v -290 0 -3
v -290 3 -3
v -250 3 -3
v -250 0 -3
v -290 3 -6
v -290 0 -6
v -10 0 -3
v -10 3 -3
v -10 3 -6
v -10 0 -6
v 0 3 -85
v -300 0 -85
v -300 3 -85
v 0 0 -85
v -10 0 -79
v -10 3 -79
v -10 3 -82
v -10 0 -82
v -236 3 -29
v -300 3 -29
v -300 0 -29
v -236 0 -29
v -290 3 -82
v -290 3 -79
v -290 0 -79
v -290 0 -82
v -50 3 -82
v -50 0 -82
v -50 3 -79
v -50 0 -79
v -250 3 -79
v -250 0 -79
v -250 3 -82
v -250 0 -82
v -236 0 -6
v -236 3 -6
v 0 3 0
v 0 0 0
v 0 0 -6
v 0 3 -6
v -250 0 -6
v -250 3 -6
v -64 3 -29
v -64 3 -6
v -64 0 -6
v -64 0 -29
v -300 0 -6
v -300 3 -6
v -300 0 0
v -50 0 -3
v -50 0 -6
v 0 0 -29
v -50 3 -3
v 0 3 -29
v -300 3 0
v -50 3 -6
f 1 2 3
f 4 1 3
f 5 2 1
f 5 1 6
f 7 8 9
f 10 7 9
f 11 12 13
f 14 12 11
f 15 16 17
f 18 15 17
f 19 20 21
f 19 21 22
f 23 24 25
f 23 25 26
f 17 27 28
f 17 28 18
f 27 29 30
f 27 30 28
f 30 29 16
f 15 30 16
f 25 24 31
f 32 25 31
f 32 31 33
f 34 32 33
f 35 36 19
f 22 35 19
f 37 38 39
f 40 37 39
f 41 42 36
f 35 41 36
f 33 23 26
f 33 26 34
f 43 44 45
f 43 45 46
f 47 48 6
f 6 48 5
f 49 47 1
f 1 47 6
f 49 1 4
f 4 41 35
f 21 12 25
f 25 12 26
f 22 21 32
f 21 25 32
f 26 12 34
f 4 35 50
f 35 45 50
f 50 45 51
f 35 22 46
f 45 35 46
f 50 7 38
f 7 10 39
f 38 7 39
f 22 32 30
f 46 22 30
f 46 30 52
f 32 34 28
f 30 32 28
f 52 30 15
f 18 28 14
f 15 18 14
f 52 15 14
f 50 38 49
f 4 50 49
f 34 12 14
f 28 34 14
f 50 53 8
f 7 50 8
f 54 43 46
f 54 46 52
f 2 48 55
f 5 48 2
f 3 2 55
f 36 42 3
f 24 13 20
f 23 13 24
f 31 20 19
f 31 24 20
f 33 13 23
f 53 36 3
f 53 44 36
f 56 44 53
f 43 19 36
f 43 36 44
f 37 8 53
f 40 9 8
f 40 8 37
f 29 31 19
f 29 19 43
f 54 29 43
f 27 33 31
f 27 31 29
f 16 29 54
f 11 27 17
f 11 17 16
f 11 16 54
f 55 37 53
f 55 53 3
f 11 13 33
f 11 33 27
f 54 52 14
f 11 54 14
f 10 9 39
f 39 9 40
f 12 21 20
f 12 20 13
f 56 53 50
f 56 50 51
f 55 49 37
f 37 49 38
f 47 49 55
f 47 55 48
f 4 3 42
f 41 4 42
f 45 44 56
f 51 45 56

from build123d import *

# Parameters (mm, degrees)
SKETCH1_W           = 300
SKETCH1_H           = 85
BOSS_EXTRUDE1_DEPTH = 3
SKETCH2_W           = 40
SKETCH2_H           = 3
CUT_EXTRUDE1_DEPTH  = 3
SKETCH3_W           = 40
SKETCH3_H           = 3
CUT_EXTRUDE2_DEPTH  = 3
SKETCH4_W           = 40
SKETCH4_H           = 3
CUT_EXTRUDE3_DEPTH  = 3
SKETCH5_W           = 40
SKETCH5_H           = 3
CUT_EXTRUDE4_DEPTH  = 3
SKETCH6_W           = 64
SKETCH6_H           = 23
CUT_EXTRUDE6_DEPTH  = 3
SKETCH7_W           = 64
SKETCH7_H           = 23
CUT_EXTRUDE7_DEPTH  = 3


with BuildPart() as part:
    # Sketch1 → Boss-Extrude1 (new body)
    with BuildSketch(Plane(origin=(0, 0, 0), x_dir=(1, 0, 0), z_dir=(0, 1, 0))):
        with Locations((-150, 42.5)):
            Rectangle(SKETCH1_W, SKETCH1_H)
    extrude(amount=BOSS_EXTRUDE1_DEPTH)

    # Sketch2 → Cut-Extrude1 (cut)
    with BuildSketch(Plane(origin=(0, 3, 0), x_dir=(1, 0, 0), z_dir=(0, 1, 0))):
        with Locations((-270, 4.5)):
            Rectangle(SKETCH2_W, SKETCH2_H)
    extrude(amount=-CUT_EXTRUDE1_DEPTH, mode=Mode.SUBTRACT)

    # Sketch3 → Cut-Extrude2 (cut)
    with BuildSketch(Plane(origin=(0, 3, 0), x_dir=(1, 0, 0), z_dir=(0, 1, 0))):
        with Locations((-30, 4.5)):
            Rectangle(SKETCH3_W, SKETCH3_H)
    extrude(amount=-CUT_EXTRUDE2_DEPTH, mode=Mode.SUBTRACT)

    # Sketch4 → Cut-Extrude3 (cut)
    with BuildSketch(Plane(origin=(0, 3, 0), x_dir=(1, 0, 0), z_dir=(0, 1, 0))):
        with Locations((-30, 80.5)):
            Rectangle(SKETCH4_W, SKETCH4_H)
    extrude(amount=-CUT_EXTRUDE3_DEPTH, mode=Mode.SUBTRACT)

    # Sketch5 → Cut-Extrude4 (cut)
    with BuildSketch(Plane(origin=(0, 3, 0), x_dir=(1, 0, 0), z_dir=(0, 1, 0))):
        with Locations((-270, 80.5)):
            Rectangle(SKETCH5_W, SKETCH5_H)
    extrude(amount=-CUT_EXTRUDE4_DEPTH, mode=Mode.SUBTRACT)

    # Sketch6 → Cut-Extrude6 (cut)
    with BuildSketch(Plane(origin=(0, 3, 0), x_dir=(1, 0, 0), z_dir=(0, 1, 0))):
        with Locations((-268, 17.5)):
            Rectangle(SKETCH6_W, SKETCH6_H)
    extrude(amount=-CUT_EXTRUDE6_DEPTH, mode=Mode.SUBTRACT)

    # Sketch7 → Cut-Extrude7 (cut)
    with BuildSketch(Plane(origin=(0, 3, 0), x_dir=(1, 0, 0), z_dir=(0, 1, 0))):
        with Locations((-32, 17.5)):
            Rectangle(SKETCH7_W, SKETCH7_H)
    extrude(amount=-CUT_EXTRUDE7_DEPTH, mode=Mode.SUBTRACT)


solid = part.part
